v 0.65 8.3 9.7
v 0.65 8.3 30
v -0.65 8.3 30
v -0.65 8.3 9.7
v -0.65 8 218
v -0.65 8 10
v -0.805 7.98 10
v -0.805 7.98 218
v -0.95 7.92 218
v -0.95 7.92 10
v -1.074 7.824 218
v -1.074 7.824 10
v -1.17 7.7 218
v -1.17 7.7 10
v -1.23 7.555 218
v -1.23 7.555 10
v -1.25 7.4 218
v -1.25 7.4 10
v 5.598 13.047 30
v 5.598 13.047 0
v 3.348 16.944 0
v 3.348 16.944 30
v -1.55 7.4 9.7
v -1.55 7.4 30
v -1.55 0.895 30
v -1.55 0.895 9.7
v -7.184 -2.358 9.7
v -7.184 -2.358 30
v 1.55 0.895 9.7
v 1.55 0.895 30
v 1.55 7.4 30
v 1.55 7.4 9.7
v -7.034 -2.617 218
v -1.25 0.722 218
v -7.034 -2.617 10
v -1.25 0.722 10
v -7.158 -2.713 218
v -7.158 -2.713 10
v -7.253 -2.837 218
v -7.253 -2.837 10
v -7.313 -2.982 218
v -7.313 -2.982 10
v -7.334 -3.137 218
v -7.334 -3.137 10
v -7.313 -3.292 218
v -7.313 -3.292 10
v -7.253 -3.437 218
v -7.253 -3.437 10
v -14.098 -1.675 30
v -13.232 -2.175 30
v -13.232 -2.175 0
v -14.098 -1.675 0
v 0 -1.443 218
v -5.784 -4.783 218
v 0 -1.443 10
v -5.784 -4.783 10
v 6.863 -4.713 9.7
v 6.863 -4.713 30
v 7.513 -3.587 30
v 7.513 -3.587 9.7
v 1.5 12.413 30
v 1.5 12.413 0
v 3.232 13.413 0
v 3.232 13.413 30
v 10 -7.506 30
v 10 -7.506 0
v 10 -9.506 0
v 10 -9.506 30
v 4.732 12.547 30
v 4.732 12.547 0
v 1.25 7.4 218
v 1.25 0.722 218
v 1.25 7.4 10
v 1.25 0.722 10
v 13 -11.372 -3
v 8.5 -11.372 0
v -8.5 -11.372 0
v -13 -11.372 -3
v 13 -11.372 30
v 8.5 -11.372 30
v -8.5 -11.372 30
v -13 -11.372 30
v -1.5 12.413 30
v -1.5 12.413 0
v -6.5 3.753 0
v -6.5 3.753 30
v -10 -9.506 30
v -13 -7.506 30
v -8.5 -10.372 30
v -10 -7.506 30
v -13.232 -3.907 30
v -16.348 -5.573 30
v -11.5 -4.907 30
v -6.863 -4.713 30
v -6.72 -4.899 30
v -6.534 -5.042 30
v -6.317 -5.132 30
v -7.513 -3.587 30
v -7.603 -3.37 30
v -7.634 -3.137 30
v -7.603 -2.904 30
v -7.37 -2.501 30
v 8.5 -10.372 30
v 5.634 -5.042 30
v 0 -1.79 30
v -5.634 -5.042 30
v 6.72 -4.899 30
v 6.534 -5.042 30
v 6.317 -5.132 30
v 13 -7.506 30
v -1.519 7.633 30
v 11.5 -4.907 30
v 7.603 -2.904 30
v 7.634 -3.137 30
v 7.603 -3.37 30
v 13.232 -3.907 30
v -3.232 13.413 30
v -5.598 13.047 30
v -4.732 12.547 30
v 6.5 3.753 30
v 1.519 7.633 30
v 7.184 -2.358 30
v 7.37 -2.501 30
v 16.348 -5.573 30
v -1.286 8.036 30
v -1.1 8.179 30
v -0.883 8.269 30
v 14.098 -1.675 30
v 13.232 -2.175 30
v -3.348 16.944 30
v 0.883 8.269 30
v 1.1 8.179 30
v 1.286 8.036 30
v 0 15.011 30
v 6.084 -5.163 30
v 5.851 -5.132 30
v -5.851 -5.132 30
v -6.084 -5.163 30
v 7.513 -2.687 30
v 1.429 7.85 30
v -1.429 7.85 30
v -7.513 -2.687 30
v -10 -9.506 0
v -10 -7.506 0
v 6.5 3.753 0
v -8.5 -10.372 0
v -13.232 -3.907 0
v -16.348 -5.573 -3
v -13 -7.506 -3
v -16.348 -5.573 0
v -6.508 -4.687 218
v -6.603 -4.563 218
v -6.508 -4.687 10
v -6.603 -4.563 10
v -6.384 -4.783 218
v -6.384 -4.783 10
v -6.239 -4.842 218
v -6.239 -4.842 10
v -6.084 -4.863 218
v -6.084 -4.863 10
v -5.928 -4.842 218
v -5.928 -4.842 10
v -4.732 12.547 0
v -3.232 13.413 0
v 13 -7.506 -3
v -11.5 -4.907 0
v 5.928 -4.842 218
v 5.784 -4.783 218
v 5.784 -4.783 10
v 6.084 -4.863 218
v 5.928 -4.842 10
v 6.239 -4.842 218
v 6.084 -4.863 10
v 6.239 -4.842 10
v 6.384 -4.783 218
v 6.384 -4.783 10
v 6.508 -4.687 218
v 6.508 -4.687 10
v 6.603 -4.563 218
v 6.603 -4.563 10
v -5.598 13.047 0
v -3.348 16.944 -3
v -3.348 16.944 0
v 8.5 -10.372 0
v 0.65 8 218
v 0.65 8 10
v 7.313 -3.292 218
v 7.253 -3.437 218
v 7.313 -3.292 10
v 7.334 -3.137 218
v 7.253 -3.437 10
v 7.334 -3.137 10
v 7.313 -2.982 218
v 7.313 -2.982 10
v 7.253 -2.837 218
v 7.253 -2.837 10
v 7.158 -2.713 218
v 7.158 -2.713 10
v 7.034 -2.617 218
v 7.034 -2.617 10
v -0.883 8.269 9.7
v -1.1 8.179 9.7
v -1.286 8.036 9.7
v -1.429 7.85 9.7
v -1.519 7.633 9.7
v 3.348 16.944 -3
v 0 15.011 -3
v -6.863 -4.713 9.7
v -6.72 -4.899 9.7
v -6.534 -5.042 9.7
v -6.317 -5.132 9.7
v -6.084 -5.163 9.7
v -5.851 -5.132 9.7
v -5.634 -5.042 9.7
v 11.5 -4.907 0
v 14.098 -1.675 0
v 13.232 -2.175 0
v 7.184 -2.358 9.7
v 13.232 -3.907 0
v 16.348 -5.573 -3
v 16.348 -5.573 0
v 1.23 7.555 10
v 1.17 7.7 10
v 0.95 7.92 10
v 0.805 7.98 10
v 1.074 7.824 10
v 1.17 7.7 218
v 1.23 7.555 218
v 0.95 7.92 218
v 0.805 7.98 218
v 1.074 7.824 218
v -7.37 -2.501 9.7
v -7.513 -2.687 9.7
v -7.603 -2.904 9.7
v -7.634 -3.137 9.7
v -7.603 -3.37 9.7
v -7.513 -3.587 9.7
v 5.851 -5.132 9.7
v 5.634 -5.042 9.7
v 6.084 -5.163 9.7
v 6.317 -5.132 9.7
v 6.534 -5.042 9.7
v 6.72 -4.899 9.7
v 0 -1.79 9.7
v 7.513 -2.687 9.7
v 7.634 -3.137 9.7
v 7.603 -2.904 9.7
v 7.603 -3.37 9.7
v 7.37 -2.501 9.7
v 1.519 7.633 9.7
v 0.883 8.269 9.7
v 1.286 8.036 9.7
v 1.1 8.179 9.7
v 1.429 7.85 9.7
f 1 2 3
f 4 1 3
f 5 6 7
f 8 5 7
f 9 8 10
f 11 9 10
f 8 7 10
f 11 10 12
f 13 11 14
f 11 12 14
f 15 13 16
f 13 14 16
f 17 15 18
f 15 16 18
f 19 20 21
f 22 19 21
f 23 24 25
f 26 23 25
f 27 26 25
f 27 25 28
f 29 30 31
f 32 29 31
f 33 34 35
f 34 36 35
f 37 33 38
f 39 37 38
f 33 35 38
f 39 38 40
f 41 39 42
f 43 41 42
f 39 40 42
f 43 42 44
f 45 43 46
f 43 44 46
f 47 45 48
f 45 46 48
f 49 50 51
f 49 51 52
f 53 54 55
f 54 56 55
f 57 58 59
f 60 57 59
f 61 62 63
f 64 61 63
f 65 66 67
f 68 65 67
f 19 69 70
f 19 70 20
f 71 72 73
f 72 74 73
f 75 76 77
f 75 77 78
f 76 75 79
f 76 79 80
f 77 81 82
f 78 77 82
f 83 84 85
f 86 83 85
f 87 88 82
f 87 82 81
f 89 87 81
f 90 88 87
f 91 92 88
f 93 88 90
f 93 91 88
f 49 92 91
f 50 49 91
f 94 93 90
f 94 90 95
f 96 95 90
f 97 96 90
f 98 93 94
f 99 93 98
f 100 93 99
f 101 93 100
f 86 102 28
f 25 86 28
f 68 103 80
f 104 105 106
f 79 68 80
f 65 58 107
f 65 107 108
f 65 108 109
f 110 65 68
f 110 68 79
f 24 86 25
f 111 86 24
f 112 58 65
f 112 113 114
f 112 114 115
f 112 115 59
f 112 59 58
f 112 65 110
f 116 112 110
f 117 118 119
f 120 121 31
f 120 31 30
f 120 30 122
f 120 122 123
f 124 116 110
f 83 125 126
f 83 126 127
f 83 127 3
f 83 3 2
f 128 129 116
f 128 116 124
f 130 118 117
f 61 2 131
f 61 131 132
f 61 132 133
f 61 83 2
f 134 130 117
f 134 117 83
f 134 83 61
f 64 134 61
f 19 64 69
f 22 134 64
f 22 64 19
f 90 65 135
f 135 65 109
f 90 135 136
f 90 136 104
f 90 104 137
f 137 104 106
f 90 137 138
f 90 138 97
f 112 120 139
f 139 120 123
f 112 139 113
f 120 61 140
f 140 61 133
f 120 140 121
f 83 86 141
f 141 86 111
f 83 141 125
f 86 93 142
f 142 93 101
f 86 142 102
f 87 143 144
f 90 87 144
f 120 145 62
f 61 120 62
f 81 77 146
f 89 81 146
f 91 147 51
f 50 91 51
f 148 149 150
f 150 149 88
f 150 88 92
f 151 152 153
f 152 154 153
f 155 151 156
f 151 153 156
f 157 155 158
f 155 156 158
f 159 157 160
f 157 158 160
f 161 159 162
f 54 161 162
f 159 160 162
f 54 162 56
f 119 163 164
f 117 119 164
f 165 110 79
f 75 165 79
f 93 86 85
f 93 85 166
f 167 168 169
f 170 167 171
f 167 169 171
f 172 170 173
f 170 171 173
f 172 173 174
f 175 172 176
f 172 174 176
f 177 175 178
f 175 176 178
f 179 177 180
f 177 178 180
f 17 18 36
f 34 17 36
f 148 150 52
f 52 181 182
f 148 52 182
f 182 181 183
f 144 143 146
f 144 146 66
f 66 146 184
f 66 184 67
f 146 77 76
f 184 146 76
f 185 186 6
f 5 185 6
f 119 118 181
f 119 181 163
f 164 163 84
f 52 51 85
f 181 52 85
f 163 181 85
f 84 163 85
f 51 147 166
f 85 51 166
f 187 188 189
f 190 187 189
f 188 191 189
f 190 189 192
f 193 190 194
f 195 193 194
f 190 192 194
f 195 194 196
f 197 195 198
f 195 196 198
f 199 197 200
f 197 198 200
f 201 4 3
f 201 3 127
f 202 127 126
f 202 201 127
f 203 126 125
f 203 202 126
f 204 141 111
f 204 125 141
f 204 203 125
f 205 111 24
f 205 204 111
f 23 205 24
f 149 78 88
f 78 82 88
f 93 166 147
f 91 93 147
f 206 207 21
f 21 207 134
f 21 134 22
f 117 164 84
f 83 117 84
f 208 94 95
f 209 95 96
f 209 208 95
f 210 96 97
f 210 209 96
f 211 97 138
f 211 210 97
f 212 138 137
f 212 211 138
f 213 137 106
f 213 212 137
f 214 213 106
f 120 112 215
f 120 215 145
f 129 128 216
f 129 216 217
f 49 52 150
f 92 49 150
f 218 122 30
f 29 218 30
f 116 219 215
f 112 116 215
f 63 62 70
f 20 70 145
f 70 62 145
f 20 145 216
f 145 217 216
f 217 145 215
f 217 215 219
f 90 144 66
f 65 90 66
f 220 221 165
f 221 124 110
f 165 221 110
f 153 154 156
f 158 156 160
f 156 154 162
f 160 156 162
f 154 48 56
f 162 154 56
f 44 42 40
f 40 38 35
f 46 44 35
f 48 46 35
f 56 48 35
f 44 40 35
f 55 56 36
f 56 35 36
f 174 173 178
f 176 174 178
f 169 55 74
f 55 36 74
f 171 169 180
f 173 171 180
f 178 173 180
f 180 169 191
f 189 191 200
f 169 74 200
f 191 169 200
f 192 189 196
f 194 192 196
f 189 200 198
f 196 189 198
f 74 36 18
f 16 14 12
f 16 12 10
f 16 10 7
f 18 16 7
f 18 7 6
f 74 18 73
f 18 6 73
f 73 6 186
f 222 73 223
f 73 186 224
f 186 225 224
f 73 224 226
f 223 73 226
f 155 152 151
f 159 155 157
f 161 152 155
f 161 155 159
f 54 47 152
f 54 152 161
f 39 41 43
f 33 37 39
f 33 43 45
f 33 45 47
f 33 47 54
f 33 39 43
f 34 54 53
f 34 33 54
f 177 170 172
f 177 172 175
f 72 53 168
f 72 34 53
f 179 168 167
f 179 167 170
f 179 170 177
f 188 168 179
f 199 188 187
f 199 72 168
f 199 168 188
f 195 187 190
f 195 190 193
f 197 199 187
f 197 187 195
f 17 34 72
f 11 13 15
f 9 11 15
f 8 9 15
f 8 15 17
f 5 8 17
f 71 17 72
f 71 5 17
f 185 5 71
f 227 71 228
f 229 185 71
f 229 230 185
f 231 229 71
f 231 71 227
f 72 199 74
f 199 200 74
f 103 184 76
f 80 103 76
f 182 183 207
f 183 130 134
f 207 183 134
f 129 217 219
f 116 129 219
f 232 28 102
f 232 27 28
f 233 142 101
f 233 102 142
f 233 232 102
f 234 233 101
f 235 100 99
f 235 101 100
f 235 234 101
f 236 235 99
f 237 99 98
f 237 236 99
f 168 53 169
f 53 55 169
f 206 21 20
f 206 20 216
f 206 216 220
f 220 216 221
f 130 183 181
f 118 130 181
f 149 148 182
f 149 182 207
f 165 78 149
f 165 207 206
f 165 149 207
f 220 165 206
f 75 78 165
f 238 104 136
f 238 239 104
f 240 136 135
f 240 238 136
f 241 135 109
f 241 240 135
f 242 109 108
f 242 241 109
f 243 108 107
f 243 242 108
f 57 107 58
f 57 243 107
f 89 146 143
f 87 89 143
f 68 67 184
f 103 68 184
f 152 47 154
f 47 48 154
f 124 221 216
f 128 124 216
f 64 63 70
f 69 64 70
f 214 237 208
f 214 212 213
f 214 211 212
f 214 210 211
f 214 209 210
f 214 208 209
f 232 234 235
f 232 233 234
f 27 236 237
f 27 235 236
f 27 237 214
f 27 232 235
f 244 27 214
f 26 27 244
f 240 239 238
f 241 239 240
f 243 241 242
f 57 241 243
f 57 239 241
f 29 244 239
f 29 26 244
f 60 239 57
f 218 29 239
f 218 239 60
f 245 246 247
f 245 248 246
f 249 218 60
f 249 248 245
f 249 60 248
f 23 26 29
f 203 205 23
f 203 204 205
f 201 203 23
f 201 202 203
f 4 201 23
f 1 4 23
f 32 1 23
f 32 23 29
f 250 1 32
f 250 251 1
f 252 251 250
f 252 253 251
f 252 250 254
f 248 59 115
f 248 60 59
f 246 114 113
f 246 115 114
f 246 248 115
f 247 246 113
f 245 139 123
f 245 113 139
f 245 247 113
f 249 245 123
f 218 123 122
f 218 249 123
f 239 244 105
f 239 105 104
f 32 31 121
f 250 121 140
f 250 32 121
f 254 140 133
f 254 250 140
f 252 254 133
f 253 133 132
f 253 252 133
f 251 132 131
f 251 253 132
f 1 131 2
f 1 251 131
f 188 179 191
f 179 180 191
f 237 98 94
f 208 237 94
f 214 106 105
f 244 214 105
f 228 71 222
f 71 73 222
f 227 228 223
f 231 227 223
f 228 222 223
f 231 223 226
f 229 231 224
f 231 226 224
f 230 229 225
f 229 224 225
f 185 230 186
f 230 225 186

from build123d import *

# Parameters (mm, degrees)
F1_DEPTH      = 30
F3_DEPTH      = 3
F5_DEPTH      = 20
F5_DEPTH_BACK = 188
F6_OFFSET     = 0.3


with BuildPart() as f1:
    # F0 (on Top) → F1 (new body)
    with BuildSketch(Plane.XY):
        Polygon((-10, -7.5055534995), (0, -7.5055534995), (10, -7.5055534995), (10, -9.5055534995), (8.5, -10.3715789032), (8.5, -11.3715789032), (13, -11.3715789032), (13, -7.5055534995), (16.3480762114, -5.5725407976), (14.0980762114, -1.6754264805), (13.2320508076, -2.1754264805), (13.2320508076, -3.9074772881), (11.5, -4.9074772881), (6.5, 3.7527767497), (1.5, 12.4130307876), (3.2320508076, 13.4130307876), (4.7320508076, 12.5470053838), (5.5980762114, 13.0470053838), (3.3480762114, 16.9441197008), (0, 15.0111069989), (-3.3480762114, 16.9441197008), (-5.5980762114, 13.0470053838), (-4.7320508076, 12.5470053838), (-3.2320508076, 13.4130307876), (-1.5, 12.4130307876), (-6.5, 3.7527767497), (-11.5, -4.9074772881), (-13.2320508076, -3.9074772881), (-13.2320508076, -2.1754264805), (-14.0980762114, -1.6754264805), (-16.3480762114, -5.5725407976), (-13, -7.5055534995), (-13, -11.3715789032), (-8.5, -11.3715789032), (-8.5, -10.3715789032), (-10, -9.5055534995), align=None)
    extrude(amount=F1_DEPTH)

    # F2 (on face) → F3 (join)
    with BuildSketch(Plane(origin=(0, 0, 0), x_dir=(1, 0, 0), z_dir=(0, 0, -1))):
        Polygon((13, 11.3715789032), (-13, 11.3715789032), (-13, 7.5055534995), (-16.3480762114, 5.5725407976), (-3.3480762114, -16.9441197008), (0, -15.0111069989), (3.3480762114, -16.9441197008), (16.3480762114, 5.5725407976), (13, 7.5055534995), align=None)
    extrude(amount=F3_DEPTH)


with BuildPart() as f5:
    # F4 (on face) → F5 (new body, two sides)
    with BuildSketch(Plane.XY.offset(30)) as f5_sk:
        with BuildLine():
            Line((-1.25, 7.4), (-1.25, 0.7216878365))
            Line((-1.25, 0.7216878365), (-7.033587988, -2.6174682453))
            ThreePointArc((-7.033587988, -2.6174682453), (-7.3131434838, -2.9817920605), (-7.2532032303, -3.4370834875))
            Line((-7.2532032303, -3.4370834875), (-6.6032032303, -4.5629165125))
            ThreePointArc((-6.6032032303, -4.5629165125), (-6.2388794151, -4.8424720082), (-5.783587988, -4.7825317547))
            Line((-5.783587988, -4.7825317547), (0, -1.443375673))
            Line((0, -1.443375673), (5.783587988, -4.7825317547))
            ThreePointArc((5.783587988, -4.7825317547), (6.2388794151, -4.8424720082), (6.6032032303, -4.5629165125))
            Line((6.6032032303, -4.5629165125), (7.2532032303, -3.4370834875))
            ThreePointArc((7.2532032303, -3.4370834875), (7.3131434838, -2.9817920605), (7.033587988, -2.6174682453))
            Line((7.033587988, -2.6174682453), (1.25, 0.7216878365))
            Line((1.25, 0.7216878365), (1.25, 7.4))
            ThreePointArc((1.25, 7.4), (1.0742640687, 7.8242640687), (0.65, 8))
            Line((0.65, 8), (-0.65, 8))
            ThreePointArc((-0.65, 8), (-1.0742640687, 7.8242640687), (-1.25, 7.4))
        make_face()
    extrude(amount=-F5_DEPTH)
    extrude(f5_sk.sketch, amount=F5_DEPTH_BACK)


with BuildPart() as f1_1:
    add(f1.part)

    # F6: cut F5, made larger all round first
    f6_tool = offset(f5.part, amount=F6_OFFSET, kind=Kind.INTERSECTION, mode=Mode.PRIVATE)
    add(f6_tool, mode=Mode.SUBTRACT)


solid = Compound([f5.part, f1_1.part])
